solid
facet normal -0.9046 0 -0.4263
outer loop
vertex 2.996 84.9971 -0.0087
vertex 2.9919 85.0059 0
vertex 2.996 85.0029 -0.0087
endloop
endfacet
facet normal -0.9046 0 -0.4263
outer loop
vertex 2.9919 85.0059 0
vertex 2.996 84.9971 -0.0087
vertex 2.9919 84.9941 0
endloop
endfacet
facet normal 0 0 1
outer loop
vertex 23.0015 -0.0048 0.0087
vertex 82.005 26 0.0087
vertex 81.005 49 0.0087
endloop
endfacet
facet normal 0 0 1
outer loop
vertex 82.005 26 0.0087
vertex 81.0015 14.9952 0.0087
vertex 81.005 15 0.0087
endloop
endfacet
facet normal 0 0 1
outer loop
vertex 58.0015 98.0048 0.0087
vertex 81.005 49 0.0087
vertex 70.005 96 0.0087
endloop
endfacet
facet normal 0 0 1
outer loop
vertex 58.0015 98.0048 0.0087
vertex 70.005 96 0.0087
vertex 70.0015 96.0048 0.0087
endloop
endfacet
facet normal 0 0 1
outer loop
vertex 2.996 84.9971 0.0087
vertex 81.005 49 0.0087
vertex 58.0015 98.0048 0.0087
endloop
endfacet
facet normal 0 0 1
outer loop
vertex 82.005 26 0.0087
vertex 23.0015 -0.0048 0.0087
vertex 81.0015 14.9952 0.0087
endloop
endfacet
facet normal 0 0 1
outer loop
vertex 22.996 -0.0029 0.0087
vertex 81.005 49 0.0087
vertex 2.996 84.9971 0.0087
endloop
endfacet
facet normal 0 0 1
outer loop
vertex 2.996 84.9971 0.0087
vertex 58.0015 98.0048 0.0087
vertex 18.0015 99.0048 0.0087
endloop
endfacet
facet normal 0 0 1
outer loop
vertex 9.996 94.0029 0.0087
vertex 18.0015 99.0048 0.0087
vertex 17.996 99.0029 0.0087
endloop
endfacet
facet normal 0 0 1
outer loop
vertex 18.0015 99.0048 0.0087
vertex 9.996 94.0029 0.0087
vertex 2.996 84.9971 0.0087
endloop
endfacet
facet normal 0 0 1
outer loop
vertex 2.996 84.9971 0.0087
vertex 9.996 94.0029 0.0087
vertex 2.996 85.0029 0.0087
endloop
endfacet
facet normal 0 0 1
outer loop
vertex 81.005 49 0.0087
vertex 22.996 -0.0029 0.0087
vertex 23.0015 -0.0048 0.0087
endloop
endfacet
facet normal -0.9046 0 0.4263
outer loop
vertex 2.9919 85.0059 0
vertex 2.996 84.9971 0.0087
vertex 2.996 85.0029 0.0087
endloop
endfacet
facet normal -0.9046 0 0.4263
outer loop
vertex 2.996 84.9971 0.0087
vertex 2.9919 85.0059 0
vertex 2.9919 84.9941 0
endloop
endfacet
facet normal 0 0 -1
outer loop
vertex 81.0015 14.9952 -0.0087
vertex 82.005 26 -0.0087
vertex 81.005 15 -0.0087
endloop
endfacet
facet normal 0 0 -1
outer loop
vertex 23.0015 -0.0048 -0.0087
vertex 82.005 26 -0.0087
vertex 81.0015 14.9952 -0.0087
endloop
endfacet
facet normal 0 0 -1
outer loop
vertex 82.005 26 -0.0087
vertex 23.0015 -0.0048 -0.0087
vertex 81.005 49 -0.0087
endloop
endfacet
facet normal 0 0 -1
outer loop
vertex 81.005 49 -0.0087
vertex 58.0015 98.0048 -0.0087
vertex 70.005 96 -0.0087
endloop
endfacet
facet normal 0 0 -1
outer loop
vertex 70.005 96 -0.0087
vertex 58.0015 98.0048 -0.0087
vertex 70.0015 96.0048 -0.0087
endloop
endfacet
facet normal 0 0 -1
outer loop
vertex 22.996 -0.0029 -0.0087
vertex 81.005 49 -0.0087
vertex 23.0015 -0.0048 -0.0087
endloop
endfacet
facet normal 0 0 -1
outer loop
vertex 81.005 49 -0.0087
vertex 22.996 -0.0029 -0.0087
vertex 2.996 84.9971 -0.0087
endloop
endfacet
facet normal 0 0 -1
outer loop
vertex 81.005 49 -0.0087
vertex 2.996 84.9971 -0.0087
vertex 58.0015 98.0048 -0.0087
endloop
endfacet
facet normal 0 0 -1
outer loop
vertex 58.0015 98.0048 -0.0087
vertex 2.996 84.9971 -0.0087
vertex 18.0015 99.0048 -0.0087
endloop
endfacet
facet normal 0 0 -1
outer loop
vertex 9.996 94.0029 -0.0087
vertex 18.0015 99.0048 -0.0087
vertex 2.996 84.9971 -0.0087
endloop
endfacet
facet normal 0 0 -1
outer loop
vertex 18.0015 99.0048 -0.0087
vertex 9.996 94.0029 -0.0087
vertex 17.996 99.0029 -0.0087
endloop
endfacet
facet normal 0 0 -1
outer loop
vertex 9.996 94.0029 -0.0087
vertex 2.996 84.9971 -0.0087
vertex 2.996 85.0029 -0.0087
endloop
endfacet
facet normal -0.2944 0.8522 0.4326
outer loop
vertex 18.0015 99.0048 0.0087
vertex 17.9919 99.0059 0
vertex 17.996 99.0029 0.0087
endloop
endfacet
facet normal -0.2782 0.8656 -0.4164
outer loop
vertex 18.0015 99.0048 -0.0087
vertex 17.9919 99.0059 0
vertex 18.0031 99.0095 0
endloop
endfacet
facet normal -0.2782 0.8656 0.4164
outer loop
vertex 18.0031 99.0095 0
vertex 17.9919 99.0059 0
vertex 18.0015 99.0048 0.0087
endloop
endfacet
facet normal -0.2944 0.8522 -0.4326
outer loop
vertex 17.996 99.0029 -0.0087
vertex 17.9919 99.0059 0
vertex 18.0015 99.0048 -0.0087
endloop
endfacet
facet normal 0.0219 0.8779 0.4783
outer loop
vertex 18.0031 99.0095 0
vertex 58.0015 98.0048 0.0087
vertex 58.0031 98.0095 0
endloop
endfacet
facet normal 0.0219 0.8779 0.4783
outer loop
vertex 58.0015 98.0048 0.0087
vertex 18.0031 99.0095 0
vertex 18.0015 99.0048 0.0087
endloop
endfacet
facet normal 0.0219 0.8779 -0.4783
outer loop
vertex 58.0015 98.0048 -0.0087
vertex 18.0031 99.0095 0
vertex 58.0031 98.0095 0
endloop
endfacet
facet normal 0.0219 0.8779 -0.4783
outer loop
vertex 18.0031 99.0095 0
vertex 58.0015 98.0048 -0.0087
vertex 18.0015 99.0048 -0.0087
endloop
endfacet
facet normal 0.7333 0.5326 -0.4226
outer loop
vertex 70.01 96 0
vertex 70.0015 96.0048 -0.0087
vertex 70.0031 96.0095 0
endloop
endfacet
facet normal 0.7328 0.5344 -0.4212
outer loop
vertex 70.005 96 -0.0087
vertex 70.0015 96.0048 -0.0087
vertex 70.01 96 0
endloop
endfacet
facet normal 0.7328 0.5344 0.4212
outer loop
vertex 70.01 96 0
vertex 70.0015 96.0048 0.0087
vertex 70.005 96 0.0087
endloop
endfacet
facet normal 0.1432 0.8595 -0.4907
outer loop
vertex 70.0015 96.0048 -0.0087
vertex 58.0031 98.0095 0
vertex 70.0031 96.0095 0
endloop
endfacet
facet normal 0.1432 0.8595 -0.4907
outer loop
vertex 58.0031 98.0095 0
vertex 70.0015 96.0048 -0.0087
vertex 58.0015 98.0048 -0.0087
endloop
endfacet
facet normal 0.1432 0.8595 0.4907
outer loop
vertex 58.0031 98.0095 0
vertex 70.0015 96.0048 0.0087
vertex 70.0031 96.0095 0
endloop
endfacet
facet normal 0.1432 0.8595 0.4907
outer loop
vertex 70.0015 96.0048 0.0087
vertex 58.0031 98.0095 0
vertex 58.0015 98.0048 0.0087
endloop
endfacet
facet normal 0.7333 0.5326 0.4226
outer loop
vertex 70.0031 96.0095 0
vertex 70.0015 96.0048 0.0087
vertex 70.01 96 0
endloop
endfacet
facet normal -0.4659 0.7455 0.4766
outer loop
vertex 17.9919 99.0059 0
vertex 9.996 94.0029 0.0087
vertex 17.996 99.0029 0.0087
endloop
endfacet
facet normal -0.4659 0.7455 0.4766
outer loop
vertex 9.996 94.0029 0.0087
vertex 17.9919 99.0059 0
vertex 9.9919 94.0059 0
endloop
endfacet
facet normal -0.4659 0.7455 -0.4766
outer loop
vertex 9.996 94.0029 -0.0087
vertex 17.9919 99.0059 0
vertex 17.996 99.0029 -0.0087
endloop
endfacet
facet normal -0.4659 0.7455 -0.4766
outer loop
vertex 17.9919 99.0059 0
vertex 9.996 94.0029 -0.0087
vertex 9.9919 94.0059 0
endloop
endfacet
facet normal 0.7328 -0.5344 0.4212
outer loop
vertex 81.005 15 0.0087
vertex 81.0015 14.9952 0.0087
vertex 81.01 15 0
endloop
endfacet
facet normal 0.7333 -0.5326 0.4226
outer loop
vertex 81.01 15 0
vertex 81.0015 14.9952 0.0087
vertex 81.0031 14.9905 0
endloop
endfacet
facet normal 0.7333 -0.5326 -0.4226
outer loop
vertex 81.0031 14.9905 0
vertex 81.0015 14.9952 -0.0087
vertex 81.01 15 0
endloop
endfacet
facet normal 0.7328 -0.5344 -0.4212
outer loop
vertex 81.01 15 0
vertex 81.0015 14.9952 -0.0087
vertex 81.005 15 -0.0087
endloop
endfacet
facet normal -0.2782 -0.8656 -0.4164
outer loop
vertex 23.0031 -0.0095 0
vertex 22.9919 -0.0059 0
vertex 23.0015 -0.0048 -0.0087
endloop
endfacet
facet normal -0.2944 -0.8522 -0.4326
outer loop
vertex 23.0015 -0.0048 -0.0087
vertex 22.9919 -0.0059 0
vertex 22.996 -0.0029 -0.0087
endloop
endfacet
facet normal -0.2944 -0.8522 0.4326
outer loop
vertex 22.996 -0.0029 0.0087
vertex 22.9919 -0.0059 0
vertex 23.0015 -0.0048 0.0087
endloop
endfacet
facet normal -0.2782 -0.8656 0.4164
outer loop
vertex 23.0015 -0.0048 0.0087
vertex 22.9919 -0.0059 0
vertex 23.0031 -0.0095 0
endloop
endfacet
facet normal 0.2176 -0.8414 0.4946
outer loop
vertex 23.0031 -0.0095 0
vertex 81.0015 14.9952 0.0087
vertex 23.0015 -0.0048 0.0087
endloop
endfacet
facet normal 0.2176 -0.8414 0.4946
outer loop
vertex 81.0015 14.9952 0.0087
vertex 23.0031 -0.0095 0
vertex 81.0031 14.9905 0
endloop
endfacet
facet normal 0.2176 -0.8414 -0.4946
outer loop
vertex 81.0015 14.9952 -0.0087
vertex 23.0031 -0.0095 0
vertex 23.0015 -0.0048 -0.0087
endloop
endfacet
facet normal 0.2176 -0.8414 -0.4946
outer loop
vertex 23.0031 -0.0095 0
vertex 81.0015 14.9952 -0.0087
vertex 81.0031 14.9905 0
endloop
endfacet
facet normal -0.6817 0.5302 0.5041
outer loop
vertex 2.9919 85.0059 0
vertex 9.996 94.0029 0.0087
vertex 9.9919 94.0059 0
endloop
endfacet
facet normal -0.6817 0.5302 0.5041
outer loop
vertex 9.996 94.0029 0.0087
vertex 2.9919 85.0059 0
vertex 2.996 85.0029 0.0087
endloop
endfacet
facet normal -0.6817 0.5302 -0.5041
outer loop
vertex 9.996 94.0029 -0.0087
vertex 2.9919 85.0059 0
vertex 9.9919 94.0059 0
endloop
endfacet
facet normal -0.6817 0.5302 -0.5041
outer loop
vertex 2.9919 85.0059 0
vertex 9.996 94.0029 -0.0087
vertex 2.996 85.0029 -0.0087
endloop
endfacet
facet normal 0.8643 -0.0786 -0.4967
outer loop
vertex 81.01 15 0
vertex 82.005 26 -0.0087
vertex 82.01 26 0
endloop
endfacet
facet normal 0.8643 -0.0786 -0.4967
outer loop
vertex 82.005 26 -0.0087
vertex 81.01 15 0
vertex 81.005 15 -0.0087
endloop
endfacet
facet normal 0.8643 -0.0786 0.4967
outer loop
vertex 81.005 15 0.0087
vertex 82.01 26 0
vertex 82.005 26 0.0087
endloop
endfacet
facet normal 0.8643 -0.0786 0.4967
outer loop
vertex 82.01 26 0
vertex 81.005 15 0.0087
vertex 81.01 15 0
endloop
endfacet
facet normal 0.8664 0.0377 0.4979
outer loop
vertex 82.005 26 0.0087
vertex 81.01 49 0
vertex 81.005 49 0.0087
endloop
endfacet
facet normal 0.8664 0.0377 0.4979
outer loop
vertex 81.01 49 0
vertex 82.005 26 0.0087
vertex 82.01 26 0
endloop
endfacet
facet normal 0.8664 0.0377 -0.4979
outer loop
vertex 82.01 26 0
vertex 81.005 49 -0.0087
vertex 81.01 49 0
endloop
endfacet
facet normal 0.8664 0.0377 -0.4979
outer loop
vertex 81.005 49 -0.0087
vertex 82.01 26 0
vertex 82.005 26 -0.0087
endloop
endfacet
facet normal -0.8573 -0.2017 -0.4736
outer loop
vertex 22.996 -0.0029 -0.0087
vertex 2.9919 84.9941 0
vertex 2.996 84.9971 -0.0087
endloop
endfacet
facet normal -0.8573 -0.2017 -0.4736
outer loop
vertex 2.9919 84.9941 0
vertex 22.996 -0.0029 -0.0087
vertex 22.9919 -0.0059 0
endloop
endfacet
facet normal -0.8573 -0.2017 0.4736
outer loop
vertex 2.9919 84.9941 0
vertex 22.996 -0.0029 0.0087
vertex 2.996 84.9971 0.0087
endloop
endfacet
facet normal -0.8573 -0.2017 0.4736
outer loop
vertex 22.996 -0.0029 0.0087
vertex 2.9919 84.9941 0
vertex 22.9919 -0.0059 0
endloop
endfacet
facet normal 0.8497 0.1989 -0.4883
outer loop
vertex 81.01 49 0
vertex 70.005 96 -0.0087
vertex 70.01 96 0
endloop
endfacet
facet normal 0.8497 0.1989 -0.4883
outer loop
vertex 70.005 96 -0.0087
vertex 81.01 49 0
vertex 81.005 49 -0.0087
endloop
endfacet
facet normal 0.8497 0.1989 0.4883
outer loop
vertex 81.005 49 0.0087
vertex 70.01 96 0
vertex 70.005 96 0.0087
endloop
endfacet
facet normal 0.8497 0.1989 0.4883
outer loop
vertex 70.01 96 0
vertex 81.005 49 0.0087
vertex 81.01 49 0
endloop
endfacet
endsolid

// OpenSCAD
color([0.9221305525684157,0.837748898711002,0.8622867035840079]) hull(){
    translate([18,58]) sphere(0.01);
    translate([6,84]) sphere(0.01);
    translate([3,85]) sphere(0.01);
}
color([0.727429224436118,0.821332708873966,0.2567577523046298]) hull(){
    translate([18,58]) sphere(0.01);
    translate([6,84]) sphere(0.01);
    translate([16,79]) sphere(0.01);
}
color([0.1353372895865157,0.7613019869252476,0.15437996216449157]) hull(){
    translate([18,58]) sphere(0.01);
    translate([18,24]) sphere(0.01);
    translate([26,51]) sphere(0.01);
}
color([0.5724302025923821,0.22728732004270547,0.8377719495956792]) hull(){
    translate([18,58]) sphere(0.01);
    translate([18,24]) sphere(0.01);
    translate([3,85]) sphere(0.01);
}
color([0.3661955888727618,0.7135191579002272,0.515047468161266]) hull(){
    translate([18,58]) sphere(0.01);
    translate([26,51]) sphere(0.01);
    translate([30,57]) sphere(0.01);
}
color([0.13764795316468892,0.40448573996937276,0.8917260836787828]) hull(){
    translate([18,58]) sphere(0.01);
    translate([30,57]) sphere(0.01);
    translate([16,79]) sphere(0.01);
}
color([0.7643233656004556,0.5236824296690593,0.15029798138806982]) hull(){
    translate([58,98]) sphere(0.01);
    translate([50,93]) sphere(0.01);
    translate([39,98]) sphere(0.01);
}
color([0.9580407420374472,0.6000911555631969,0.025324835711835636]) hull(){
    translate([58,98]) sphere(0.01);
    translate([50,93]) sphere(0.01);
    translate([59,71]) sphere(0.01);
}
color([0.8628581448400192,0.48332959823715915,0.760144685355809]) hull(){
    translate([58,98]) sphere(0.01);
    translate([39,98]) sphere(0.01);
    translate([18,99]) sphere(0.01);
}
color([0.17349489212301172,0.7172022627612936,0.8738126079333703]) hull(){
    translate([58,98]) sphere(0.01);
    translate([59,71]) sphere(0.01);
    translate([70,96]) sphere(0.01);
}
color([0.7407081150283871,0.1750257628023656,0.7717601752613227]) hull(){
    translate([22,90]) sphere(0.01);
    translate([10,94]) sphere(0.01);
    translate([20,83]) sphere(0.01);
}
color([0.17462951192396858,0.1365817917740666,0.790898096633715]) hull(){
    translate([22,90]) sphere(0.01);
    translate([10,94]) sphere(0.01);
    translate([18,99]) sphere(0.01);
}
color([0.05068813004758421,0.2747417086491215,0.9775332998919624]) hull(){
    translate([22,90]) sphere(0.01);
    translate([39,98]) sphere(0.01);
    translate([20,83]) sphere(0.01);
}
color([0.3741990821064618,0.5760507248775137,0.9764706525564496]) hull(){
    translate([22,90]) sphere(0.01);
    translate([39,98]) sphere(0.01);
    translate([18,99]) sphere(0.01);
}
color([0.6412339051880062,0.9116486495874845,0.653753263894704]) hull(){
    translate([50,93]) sphere(0.01);
    translate([39,98]) sphere(0.01);
    translate([20,83]) sphere(0.01);
}
color([0.7391387592304974,0.7973855488942889,0.8338139774032114]) hull(){
    translate([50,93]) sphere(0.01);
    translate([59,71]) sphere(0.01);
    translate([20,83]) sphere(0.01);
}
color([0.5893068505654989,0.9387852932083598,0.6768105799142914]) hull(){
    translate([44,55]) sphere(0.01);
    translate([44,47]) sphere(0.01);
    translate([35,48]) sphere(0.01);
}
color([0.26314077483765086,0.6459233453457565,0.8790980253849315]) hull(){
    translate([44,55]) sphere(0.01);
    translate([44,47]) sphere(0.01);
    translate([77,50]) sphere(0.01);
}
color([0.15362837418895858,0.31061588741770185,0.8944360920803668]) hull(){
    translate([44,55]) sphere(0.01);
    translate([59,71]) sphere(0.01);
    translate([77,50]) sphere(0.01);
}
color([0.2723573567519545,0.029723278769515638,0.14137415559711708]) hull(){
    translate([44,55]) sphere(0.01);
    translate([59,71]) sphere(0.01);
    translate([30,57]) sphere(0.01);
}
color([0.24588268133825053,0.688989335517289,0.012833732972479917]) hull(){
    translate([44,55]) sphere(0.01);
    translate([35,48]) sphere(0.01);
    translate([30,57]) sphere(0.01);
}
color([0.4317421186444177,0.09476467904542085,0.2539030370426648]) hull(){
    translate([64,14]) sphere(0.01);
    translate([68,15]) sphere(0.01);
    translate([81,15]) sphere(0.01);
}
color([0.4433940275438375,0.6374619106411259,0.7629796076056016]) hull(){
    translate([64,14]) sphere(0.01);
    translate([68,15]) sphere(0.01);
    translate([72,20]) sphere(0.01);
}
color([0.33974962563874156,0.40746011996126574,0.8304662499681598]) hull(){
    translate([64,14]) sphere(0.01);
    translate([58,33]) sphere(0.01);
    translate([42,29]) sphere(0.01);
}
color([0.03737370743548629,0.7771030741686201,0.7450583503430228]) hull(){
    translate([64,14]) sphere(0.01);
    translate([58,33]) sphere(0.01);
    translate([72,20]) sphere(0.01);
}
color([0.7664898273962963,0.9635930682622835,0.37370940745190284]) hull(){
    translate([64,14]) sphere(0.01);
    translate([42,29]) sphere(0.01);
    translate([23,0]) sphere(0.01);
}
color([0.5269890278256799,0.7391003970289415,0.05440955639390033]) hull(){
    translate([64,14]) sphere(0.01);
    translate([81,15]) sphere(0.01);
    translate([23,0]) sphere(0.01);
}
color([0.16266859334294614,0.5860851836586503,0.6198514899274227]) hull(){
    translate([68,15]) sphere(0.01);
    translate([81,15]) sphere(0.01);
    translate([72,20]) sphere(0.01);
}
color([0.617768007375954,0.696939114622172,0.24987298892689824]) hull(){
    translate([10,94]) sphere(0.01);
    translate([6,84]) sphere(0.01);
    translate([20,83]) sphere(0.01);
}
color([0.10727882524928667,0.2542017095222042,0.647326061070541]) hull(){
    translate([10,94]) sphere(0.01);
    translate([6,84]) sphere(0.01);
    translate([3,85]) sphere(0.01);
}
color([0.6145129037504997,0.7319188036610002,0.2916410122362264]) hull(){
    translate([58,33]) sphere(0.01);
    translate([82,26]) sphere(0.01);
    translate([77,50]) sphere(0.01);
}
color([0.46410792523938205,0.009432899408237327,0.2601511175245954]) hull(){
    translate([58,33]) sphere(0.01);
    translate([82,26]) sphere(0.01);
    translate([72,20]) sphere(0.01);
}
color([0.9661595458779266,0.8212204941997756,0.9717572370221306]) hull(){
    translate([58,33]) sphere(0.01);
    translate([42,29]) sphere(0.01);
    translate([44,47]) sphere(0.01);
}
color([0.7094339661906762,0.3687560915635114,0.91551222113324]) hull(){
    translate([58,33]) sphere(0.01);
    translate([44,47]) sphere(0.01);
    translate([77,50]) sphere(0.01);
}
color([0.32058638357595914,0.6286861798780845,0.3438006598659582]) hull(){
    translate([6,84]) sphere(0.01);
    translate([20,83]) sphere(0.01);
    translate([16,79]) sphere(0.01);
}
color([0.6764002586894835,0.49002609359593985,0.6828992283474875]) hull(){
    translate([82,26]) sphere(0.01);
    translate([81,15]) sphere(0.01);
    translate([72,20]) sphere(0.01);
}
color([0.9457740861038292,0.48113916365283227,0.11743485119222763]) hull(){
    translate([82,26]) sphere(0.01);
    translate([77,50]) sphere(0.01);
    translate([81,49]) sphere(0.01);
}
color([0.6785611781392669,0.3559530637070777,0.24479389591231593]) hull(){
    translate([42,29]) sphere(0.01);
    translate([26,22]) sphere(0.01);
    translate([35,48]) sphere(0.01);
}
color([0.19718264729666257,0.5265513877214916,0.7820972605832109]) hull(){
    translate([42,29]) sphere(0.01);
    translate([26,22]) sphere(0.01);
    translate([23,0]) sphere(0.01);
}
color([0.016540899859545988,0.2649906914184337,0.6195666266963675]) hull(){
    translate([42,29]) sphere(0.01);
    translate([44,47]) sphere(0.01);
    translate([35,48]) sphere(0.01);
}
color([0.9400622663204184,0.8580807518186289,0.33004078082379396]) hull(){
    translate([26,22]) sphere(0.01);
    translate([18,24]) sphere(0.01);
    translate([26,51]) sphere(0.01);
}
color([0.9838273149753736,0.1297919343219498,0.6092048694604357]) hull(){
    translate([26,22]) sphere(0.01);
    translate([18,24]) sphere(0.01);
    translate([24,21]) sphere(0.01);
}
color([0.4362496777237921,0.204876863896859,0.7703581377154641]) hull(){
    translate([26,22]) sphere(0.01);
    translate([26,51]) sphere(0.01);
    translate([35,48]) sphere(0.01);
}
color([0.24016059236570497,0.9925708955515705,0.45030012798788]) hull(){
    translate([26,22]) sphere(0.01);
    translate([23,0]) sphere(0.01);
    translate([24,21]) sphere(0.01);
}
color([0.6687095525163839,0.6084946124880205,0.9354113971140408]) hull(){
    translate([18,24]) sphere(0.01);
    translate([23,0]) sphere(0.01);
    translate([24,21]) sphere(0.01);
}
color([0.40170597484563164,0.9257642462472301,0.7352475143256585]) hull(){
    translate([18,24]) sphere(0.01);
    translate([23,0]) sphere(0.01);
    translate([3,85]) sphere(0.01);
}
color([0.9040805991886998,0.8303556425691195,0.04360117165228117]) hull(){
    translate([80,52]) sphere(0.01);
    translate([59,71]) sphere(0.01);
    translate([77,50]) sphere(0.01);
}
color([0.19461635406133904,0.24937487606759356,0.948798389089598]) hull(){
    translate([80,52]) sphere(0.01);
    translate([59,71]) sphere(0.01);
    translate([70,96]) sphere(0.01);
}
color([0.463582495028668,0.8326751819056648,0.9518902994268229]) hull(){
    translate([80,52]) sphere(0.01);
    translate([77,50]) sphere(0.01);
    translate([81,49]) sphere(0.01);
}
color([0.6590575290507751,0.08125165305796267,0.4650668984349794]) hull(){
    translate([80,52]) sphere(0.01);
    translate([81,49]) sphere(0.01);
    translate([70,96]) sphere(0.01);
}
color([0.7959185631816963,0.11921151794914897,0.3955919798495292]) hull(){
    translate([26,51]) sphere(0.01);
    translate([35,48]) sphere(0.01);
    translate([30,57]) sphere(0.01);
}
color([0.9677071171037346,0.6413149765805175,0.6980206654320958]) hull(){
    translate([59,71]) sphere(0.01);
    translate([20,83]) sphere(0.01);
    translate([30,57]) sphere(0.01);
}
color([0.8040097371122532,0.02969664254607307,0.6148562424214081]) hull(){
    translate([20,83]) sphere(0.01);
    translate([30,57]) sphere(0.01);
    translate([16,79]) sphere(0.01);
}
